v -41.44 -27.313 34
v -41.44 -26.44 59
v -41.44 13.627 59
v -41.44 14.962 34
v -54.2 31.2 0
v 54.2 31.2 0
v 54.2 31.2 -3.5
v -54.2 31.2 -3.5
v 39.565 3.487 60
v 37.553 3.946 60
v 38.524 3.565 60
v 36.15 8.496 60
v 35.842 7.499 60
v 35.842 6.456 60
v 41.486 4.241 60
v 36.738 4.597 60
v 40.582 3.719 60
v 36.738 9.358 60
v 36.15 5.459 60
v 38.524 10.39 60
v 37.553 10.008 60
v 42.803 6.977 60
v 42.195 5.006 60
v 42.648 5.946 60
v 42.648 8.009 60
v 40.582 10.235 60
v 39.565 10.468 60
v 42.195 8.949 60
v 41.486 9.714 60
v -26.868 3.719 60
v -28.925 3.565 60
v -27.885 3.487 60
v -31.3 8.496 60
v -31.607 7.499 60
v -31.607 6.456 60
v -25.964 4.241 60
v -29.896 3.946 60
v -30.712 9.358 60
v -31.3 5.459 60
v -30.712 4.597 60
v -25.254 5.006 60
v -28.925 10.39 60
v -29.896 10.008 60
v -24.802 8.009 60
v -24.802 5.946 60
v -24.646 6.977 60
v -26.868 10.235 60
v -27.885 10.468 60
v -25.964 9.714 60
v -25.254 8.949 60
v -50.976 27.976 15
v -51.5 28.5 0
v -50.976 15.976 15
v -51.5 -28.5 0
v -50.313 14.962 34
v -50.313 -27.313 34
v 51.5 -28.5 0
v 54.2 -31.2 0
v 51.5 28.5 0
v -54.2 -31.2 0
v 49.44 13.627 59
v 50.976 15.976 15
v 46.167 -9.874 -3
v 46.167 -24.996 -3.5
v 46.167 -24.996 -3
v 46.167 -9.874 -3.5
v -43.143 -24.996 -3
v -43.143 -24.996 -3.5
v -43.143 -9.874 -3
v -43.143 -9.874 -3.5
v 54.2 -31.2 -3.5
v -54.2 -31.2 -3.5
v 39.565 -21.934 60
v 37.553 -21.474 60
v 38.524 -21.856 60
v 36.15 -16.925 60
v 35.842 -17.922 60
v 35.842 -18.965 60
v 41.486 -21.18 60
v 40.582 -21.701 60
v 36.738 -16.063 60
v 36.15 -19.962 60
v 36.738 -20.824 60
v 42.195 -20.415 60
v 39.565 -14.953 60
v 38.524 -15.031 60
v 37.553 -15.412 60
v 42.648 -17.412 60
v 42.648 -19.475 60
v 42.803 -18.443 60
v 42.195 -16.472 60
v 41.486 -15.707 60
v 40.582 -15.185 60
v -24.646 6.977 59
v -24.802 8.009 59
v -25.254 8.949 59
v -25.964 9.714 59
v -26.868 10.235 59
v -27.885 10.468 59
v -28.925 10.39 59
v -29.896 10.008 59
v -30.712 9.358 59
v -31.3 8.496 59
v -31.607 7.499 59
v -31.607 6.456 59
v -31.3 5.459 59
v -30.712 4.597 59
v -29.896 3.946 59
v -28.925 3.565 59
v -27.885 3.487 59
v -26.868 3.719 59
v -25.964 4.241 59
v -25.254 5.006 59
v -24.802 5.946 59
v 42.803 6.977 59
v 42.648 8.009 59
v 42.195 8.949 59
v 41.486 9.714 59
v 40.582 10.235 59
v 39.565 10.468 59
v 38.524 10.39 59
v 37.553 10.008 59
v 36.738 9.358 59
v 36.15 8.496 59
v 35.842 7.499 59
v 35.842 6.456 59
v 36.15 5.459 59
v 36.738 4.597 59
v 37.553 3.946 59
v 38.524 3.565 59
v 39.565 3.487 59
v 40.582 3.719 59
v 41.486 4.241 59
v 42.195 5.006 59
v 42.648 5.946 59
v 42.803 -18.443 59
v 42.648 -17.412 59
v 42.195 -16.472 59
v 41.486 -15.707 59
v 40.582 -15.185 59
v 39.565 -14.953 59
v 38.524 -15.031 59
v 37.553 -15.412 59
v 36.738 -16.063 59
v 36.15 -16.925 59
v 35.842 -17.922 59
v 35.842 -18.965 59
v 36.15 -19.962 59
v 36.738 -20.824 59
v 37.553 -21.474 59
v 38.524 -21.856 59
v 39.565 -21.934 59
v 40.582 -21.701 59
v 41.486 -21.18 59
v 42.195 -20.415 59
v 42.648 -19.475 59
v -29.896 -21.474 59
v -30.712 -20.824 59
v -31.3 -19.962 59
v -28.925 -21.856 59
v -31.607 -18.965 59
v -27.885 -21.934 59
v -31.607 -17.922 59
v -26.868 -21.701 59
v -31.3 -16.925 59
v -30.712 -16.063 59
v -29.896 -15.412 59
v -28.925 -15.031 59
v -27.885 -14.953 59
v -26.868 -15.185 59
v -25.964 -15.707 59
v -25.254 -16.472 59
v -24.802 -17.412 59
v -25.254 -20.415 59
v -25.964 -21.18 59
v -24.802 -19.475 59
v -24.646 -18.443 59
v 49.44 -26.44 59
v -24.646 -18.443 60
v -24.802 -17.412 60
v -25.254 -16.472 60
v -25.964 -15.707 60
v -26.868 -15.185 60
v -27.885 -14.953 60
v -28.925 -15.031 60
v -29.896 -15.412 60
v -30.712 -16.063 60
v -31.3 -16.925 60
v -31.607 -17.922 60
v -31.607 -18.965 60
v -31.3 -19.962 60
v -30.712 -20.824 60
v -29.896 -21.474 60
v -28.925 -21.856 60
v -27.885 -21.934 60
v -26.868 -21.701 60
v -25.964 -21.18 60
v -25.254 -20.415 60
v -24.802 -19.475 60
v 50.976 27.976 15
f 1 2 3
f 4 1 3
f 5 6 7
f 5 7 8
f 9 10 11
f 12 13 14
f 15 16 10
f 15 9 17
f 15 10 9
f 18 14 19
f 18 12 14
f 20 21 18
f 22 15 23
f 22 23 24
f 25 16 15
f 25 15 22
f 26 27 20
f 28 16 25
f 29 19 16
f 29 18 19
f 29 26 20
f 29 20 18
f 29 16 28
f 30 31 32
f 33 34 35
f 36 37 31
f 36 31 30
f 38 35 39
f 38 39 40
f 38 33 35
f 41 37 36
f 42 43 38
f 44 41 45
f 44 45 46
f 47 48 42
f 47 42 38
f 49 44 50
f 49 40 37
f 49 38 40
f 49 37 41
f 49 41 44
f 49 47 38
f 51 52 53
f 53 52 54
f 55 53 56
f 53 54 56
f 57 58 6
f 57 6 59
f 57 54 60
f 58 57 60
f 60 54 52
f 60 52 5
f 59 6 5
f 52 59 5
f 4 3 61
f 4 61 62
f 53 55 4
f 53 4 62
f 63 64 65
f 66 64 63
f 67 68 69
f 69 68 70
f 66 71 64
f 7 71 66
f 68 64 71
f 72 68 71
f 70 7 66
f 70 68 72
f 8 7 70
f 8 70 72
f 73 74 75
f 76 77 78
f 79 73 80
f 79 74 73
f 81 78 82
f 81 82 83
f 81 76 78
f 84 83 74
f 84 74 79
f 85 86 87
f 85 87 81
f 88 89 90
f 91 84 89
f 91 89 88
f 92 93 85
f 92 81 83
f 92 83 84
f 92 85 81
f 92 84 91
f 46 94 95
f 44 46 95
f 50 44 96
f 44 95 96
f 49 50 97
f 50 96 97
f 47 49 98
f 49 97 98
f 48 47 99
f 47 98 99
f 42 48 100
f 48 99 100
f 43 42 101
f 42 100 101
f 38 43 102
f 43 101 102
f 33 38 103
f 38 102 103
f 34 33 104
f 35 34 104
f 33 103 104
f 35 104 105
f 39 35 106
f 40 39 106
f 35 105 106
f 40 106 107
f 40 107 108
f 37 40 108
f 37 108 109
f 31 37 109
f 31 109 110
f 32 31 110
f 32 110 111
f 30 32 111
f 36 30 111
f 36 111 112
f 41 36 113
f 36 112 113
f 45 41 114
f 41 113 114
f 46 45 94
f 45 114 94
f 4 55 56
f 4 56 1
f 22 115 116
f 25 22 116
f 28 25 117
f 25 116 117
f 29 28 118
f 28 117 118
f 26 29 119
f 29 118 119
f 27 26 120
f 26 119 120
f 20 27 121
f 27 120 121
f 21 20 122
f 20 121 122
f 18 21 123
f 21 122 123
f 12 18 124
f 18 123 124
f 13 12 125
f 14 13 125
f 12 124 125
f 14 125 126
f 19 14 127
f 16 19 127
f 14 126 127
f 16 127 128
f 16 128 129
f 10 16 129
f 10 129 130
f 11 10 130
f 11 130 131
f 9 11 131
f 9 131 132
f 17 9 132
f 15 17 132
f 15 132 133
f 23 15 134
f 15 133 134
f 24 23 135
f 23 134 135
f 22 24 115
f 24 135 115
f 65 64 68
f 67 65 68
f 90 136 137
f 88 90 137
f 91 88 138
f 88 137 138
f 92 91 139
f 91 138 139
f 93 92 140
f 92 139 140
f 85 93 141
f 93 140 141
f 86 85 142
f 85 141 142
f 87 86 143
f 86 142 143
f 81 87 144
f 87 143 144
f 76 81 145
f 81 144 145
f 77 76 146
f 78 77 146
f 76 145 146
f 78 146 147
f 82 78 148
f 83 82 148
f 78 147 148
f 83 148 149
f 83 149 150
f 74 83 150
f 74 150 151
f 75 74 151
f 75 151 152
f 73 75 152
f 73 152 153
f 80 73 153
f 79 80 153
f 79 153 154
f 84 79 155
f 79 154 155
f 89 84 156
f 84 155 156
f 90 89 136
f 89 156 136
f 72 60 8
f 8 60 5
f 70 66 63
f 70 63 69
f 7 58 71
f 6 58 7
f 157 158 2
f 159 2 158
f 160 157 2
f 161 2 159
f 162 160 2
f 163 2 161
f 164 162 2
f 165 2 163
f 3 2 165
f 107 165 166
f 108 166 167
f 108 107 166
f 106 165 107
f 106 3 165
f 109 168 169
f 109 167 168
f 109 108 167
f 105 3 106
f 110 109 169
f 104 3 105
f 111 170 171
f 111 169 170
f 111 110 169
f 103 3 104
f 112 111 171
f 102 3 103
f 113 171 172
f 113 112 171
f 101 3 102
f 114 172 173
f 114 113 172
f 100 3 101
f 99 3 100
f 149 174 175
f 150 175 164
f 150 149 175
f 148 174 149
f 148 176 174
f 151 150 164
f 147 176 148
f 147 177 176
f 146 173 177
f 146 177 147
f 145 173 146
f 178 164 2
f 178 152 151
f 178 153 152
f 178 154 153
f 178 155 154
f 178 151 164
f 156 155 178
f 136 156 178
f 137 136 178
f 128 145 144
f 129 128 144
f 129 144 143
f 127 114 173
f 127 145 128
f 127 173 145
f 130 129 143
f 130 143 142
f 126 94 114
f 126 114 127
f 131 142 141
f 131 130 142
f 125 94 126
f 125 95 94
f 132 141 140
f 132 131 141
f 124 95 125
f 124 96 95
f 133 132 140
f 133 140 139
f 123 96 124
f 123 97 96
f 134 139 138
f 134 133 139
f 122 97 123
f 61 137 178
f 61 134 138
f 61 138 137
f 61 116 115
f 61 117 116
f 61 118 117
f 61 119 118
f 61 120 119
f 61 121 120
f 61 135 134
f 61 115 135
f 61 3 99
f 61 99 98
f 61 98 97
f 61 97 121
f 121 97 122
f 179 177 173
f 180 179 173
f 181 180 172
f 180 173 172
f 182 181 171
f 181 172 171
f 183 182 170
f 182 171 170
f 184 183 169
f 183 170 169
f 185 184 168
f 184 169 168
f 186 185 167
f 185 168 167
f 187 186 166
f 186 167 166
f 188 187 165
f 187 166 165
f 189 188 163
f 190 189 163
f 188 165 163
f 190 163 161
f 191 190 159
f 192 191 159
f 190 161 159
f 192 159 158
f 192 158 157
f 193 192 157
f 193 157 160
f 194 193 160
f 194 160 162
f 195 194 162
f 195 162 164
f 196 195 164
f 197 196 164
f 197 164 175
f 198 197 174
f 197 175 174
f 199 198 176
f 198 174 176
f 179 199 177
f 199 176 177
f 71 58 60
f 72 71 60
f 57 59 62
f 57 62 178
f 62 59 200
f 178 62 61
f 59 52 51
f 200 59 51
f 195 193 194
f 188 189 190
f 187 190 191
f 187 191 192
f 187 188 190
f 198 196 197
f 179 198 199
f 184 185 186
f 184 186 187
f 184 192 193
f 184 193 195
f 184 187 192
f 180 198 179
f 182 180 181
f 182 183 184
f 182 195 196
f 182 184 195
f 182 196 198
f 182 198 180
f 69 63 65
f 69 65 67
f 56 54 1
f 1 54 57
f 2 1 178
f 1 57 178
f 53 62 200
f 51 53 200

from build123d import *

# Parameters (mm, degrees)
SKETCH_1_W               = 103
SKETCH_1_H               = 57
EXTRUDE_1_DEPTH          = 59
EXTRUDE_1_TAPER          = 2
SKETCH_2_W               = 39.54031551
SKETCH_2_H               = 84.548972525
CUT_EXTRUDE_1_DEPTH      = 25
SKETCH_3_R               = 3.5
EXTRUDE_2_DEPTH          = 1
SKETCH_4_W               = 108.4
SKETCH_4_H               = 62.4
EXTRUDE_3_DEPTH          = 3.5
CUT_EXTRUDE_2_DEPTH      = 87.666487179
CUT_EXTRUDE_2_DEPTH_BACK = 87.666487179
SKETCH_6_W               = 89.310356146
SKETCH_6_H               = 15.122271459
CUT_EXTRUDE_3_DEPTH      = 0.5


with BuildPart() as part:
    # 草图1 → 拉伸1 (new body)
    with BuildSketch(Plane.XY):
        Rectangle(SKETCH_1_W, SKETCH_1_H)
    extrude(amount=EXTRUDE_1_DEPTH, taper=EXTRUDE_1_TAPER)

    # 草图2 → 切除-拉伸1 (cut)
    with BuildSketch(Plane.XY.offset(59)):
        with Locations((-61.209832355, 4.206416544)):
            Rectangle(SKETCH_2_W, SKETCH_2_H)
    extrude(amount=-CUT_EXTRUDE_1_DEPTH, mode=Mode.SUBTRACT)

    # 草图3 → 拉伸2 (add)
    with BuildSketch(Plane.XY.offset(59)):
        with Locations((-28.146233383, 6.977331271)):
            Circle(SKETCH_3_R)
        with Locations((39.303298868, 6.977331271)):
            Circle(SKETCH_3_R)
        with Locations((-28.146233383, -18.443352833)):
            Circle(SKETCH_3_R)
        with Locations((39.303298868, -18.443352833)):
            Circle(SKETCH_3_R)
    extrude(amount=EXTRUDE_2_DEPTH)

    # 草图4 → 拉伸3 (add)
    with BuildSketch(Plane(origin=(0, 0, 0), x_dir=(-1, 0, 0), z_dir=(0, 0, -1))):
        Rectangle(SKETCH_4_W, SKETCH_4_H)
    extrude(amount=EXTRUDE_3_DEPTH)

    # 草图5 → 切除-拉伸2 (cut, two sides: drawn at the far end of the back side and taken through both)
    with BuildSketch(Plane(origin=(0, 0, 0), x_dir=(0, 0, -1), z_dir=(1, 0, 0)).offset(-CUT_EXTRUDE_2_DEPTH_BACK)):
        Polygon((-59, 13.626611521), (-15, 15.976188458), (-15, 27.976188458), (-59, 29.657919194), align=None)
    extrude(amount=CUT_EXTRUDE_2_DEPTH + CUT_EXTRUDE_2_DEPTH_BACK, mode=Mode.SUBTRACT)

    # 草图6 → 切除-拉伸3 (cut)
    with BuildSketch(Plane(origin=(0, 0, -3.5), x_dir=(-1, 0, 0), z_dir=(0, 0, -1))):
        with Locations((-1.512227146, -17.435089447)):
            Rectangle(SKETCH_6_W, SKETCH_6_H)
    extrude(amount=-CUT_EXTRUDE_3_DEPTH, mode=Mode.SUBTRACT)


solid = part.part
